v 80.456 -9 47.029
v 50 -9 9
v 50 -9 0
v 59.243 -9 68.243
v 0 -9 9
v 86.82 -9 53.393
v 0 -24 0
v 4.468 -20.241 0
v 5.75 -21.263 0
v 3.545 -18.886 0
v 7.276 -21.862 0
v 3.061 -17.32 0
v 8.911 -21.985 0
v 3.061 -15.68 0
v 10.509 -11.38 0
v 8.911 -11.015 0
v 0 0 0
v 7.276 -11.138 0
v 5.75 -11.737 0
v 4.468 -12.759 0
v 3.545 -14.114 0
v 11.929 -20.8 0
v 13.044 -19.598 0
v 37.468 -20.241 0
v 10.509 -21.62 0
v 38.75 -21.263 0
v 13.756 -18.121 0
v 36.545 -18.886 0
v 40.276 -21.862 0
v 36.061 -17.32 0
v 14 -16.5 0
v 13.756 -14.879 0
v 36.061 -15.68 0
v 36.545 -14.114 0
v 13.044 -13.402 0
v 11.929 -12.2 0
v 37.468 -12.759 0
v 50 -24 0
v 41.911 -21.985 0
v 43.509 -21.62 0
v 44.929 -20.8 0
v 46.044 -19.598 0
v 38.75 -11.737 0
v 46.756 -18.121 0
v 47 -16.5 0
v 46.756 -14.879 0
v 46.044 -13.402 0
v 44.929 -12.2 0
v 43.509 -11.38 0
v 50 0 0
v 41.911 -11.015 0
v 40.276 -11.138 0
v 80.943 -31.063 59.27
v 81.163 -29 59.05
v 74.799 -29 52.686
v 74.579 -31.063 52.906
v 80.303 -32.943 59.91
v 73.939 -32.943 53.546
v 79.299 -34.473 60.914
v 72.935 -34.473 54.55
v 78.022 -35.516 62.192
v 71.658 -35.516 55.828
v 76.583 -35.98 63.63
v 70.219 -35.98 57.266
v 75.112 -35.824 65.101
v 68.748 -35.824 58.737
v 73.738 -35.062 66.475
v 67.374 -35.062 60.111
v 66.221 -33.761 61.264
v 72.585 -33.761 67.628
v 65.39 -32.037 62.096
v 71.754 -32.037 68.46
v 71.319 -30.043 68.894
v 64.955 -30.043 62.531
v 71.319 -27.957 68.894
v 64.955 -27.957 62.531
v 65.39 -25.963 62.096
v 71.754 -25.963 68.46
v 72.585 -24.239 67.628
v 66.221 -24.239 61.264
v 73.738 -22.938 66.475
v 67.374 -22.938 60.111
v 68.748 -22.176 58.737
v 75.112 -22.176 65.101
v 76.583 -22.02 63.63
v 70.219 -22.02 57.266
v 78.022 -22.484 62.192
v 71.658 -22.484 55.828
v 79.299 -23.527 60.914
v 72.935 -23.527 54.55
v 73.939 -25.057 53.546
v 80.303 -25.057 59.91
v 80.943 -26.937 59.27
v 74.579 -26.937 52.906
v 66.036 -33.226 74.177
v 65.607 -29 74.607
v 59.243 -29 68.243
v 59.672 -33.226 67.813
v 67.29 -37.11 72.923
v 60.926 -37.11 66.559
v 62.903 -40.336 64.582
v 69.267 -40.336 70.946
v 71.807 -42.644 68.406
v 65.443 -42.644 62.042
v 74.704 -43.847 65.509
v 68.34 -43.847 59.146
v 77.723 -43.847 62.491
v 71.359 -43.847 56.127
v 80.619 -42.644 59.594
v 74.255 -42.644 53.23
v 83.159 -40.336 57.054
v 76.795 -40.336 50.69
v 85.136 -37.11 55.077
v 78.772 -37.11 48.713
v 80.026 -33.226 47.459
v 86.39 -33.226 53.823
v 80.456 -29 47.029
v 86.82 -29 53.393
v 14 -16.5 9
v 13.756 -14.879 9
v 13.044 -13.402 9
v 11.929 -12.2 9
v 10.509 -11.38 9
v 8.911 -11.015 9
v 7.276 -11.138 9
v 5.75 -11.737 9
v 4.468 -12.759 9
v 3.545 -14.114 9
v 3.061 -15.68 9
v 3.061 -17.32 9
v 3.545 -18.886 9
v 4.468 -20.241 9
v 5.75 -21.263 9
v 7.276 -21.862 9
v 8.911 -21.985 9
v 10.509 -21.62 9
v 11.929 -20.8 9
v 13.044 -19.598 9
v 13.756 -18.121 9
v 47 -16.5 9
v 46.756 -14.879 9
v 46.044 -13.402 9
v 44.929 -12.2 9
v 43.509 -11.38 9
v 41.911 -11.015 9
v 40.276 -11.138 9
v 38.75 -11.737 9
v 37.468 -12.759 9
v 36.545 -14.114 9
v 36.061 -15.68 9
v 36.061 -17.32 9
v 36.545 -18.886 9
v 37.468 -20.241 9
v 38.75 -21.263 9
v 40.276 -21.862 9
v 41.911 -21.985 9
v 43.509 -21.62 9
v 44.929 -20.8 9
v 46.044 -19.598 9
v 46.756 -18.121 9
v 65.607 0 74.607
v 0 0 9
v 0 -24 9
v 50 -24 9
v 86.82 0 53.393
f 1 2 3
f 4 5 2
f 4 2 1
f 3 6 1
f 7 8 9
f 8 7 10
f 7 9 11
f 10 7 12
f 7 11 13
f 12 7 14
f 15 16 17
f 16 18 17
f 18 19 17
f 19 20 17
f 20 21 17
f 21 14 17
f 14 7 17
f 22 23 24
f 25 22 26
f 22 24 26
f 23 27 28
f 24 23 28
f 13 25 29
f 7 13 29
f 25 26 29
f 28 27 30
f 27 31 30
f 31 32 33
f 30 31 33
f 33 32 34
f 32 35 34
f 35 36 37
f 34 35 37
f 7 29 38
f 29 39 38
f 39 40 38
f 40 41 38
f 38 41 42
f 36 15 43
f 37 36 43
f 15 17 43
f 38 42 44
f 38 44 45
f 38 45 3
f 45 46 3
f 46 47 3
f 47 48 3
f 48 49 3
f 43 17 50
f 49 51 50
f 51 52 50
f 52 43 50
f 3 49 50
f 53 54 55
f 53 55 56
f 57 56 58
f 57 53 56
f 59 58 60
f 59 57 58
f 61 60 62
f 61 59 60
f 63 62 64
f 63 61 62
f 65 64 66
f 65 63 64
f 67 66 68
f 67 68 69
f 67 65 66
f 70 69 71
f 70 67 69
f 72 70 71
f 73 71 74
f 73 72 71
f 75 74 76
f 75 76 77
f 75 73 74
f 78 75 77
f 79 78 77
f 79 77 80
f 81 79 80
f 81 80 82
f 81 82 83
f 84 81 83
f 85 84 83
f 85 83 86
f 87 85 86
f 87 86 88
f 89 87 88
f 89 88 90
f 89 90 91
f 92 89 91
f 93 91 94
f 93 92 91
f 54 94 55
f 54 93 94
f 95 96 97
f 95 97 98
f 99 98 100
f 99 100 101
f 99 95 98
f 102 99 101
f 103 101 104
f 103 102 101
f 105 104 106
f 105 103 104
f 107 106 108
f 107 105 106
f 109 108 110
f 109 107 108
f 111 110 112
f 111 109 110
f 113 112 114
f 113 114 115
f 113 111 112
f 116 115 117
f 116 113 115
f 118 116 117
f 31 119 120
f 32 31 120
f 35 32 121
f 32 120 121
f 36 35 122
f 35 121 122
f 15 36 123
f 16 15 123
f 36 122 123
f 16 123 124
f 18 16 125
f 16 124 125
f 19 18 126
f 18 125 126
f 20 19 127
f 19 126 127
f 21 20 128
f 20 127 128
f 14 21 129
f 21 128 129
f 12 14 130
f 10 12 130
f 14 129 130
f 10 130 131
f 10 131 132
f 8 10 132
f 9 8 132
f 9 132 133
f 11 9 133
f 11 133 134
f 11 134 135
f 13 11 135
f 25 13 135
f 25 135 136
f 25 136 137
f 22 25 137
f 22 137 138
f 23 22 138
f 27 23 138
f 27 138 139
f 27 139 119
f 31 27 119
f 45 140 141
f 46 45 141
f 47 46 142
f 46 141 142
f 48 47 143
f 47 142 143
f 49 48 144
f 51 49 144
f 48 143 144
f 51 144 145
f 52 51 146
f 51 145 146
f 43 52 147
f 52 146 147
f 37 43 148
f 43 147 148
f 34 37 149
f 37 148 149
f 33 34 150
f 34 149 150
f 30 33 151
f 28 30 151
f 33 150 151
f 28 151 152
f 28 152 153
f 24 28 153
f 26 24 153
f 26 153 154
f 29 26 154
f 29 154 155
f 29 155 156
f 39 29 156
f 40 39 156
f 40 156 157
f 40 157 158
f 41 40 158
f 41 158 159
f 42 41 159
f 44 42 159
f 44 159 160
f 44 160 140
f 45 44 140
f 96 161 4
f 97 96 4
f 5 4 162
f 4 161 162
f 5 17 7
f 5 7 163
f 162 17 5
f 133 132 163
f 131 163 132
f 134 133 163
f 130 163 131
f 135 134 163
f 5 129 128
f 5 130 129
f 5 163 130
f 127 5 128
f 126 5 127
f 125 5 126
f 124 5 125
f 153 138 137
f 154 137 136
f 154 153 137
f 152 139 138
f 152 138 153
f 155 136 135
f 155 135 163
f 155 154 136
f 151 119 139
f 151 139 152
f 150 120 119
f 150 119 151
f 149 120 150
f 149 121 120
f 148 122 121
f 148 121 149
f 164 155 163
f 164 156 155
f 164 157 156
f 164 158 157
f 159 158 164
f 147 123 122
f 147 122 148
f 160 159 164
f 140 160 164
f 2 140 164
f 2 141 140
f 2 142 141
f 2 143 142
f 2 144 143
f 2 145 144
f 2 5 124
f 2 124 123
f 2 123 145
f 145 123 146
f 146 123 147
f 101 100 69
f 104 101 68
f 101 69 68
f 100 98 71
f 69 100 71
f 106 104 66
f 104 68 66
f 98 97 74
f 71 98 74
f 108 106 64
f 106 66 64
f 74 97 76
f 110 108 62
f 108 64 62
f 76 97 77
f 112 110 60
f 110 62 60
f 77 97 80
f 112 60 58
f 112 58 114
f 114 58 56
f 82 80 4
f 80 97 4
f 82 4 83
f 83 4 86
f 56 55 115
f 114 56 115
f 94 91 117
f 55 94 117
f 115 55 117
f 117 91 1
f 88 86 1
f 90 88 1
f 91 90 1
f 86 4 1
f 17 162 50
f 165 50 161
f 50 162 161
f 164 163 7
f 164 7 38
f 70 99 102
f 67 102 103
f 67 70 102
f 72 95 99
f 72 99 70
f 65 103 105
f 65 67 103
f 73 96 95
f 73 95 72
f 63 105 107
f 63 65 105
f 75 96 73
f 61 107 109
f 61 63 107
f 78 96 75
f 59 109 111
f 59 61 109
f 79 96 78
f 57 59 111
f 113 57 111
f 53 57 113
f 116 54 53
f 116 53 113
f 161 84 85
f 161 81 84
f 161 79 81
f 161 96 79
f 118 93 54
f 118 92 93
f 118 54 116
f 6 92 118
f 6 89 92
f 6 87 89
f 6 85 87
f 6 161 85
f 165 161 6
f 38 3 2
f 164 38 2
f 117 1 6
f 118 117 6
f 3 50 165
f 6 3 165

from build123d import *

# Parameters (mm, degrees)
F1_DEPTH = 9
F2_DEPTH = 29
F4_DEPTH = 9
F5_DEPTH = 9
F0_W     = 50
F0_H     = 9
F6_DEPTH = 24
F7_R     = 5.5
F8_DEPTH = 9.001


with BuildPart() as f1:
    # F0 (on Front) → F1 (new body)
    with BuildSketch(Plane.XZ):
        Polygon((50, 9), (50, 0), (86.8198051534, 53.3933982822), (80.4558441227, 47.0294372515), (59.2426406871, 68.2426406871), (0, 9), align=None)
    extrude(amount=F1_DEPTH)

    # F0 (on Front) → F2 (join)
    with BuildSketch(Plane.XZ):
        Polygon((80.4558441227, 47.0294372515), (86.8198051534, 53.3933982822), (65.6066017178, 74.6066017178), (59.2426406871, 68.2426406871), align=None)
    extrude(amount=F2_DEPTH)

    # F3 (on face) → F4 (join)
    with BuildSketch(Plane(origin=(70.1066017178, 0, 70.1066017178), x_dir=(0.7071067812, 0, -0.7071067812), z_dir=(0.7071067812, 0, 0.7071067812))):
        with BuildLine():
            Line((23.6360389693, -29), (15.6360389693, -29))
            ThreePointArc((15.6360389693, -29), (8.6360389693, -36), (1.6360389693, -29))
            Line((1.6360389693, -29), (-6.3639610307, -29))
            ThreePointArc((-6.3639610307, -29), (8.6360389693, -44), (23.6360389693, -29))
        make_face()
    extrude(amount=-F4_DEPTH)

    # F3 (on face) → F5 (cut)
    with BuildSketch(Plane(origin=(70.1066017178, 0, 70.1066017178), x_dir=(0.7071067812, 0, -0.7071067812), z_dir=(0.7071067812, 0, 0.7071067812))):
        with BuildLine():
            Line((1.6360389693, -29), (15.6360389693, -29))
            ThreePointArc((15.6360389693, -29), (8.6360389693, -22), (1.6360389693, -29))
        make_face()
    extrude(amount=-F5_DEPTH, mode=Mode.SUBTRACT)

    # F0 (on Front) → F6 (join)
    with BuildSketch(Plane.XZ):
        with Locations((25, 4.5)):
            Rectangle(F0_W, F0_H)
    extrude(amount=F6_DEPTH)

    # F7 (on face) → F8 (cut, through all)
    with BuildSketch(Plane.XY.offset(9)):
        with Locations((8.5, -16.5)):
            Circle(F7_R)
        with Locations((41.5, -16.5)):
            Circle(F7_R)
    extrude(amount=-F8_DEPTH, mode=Mode.SUBTRACT)


solid = f1.part
